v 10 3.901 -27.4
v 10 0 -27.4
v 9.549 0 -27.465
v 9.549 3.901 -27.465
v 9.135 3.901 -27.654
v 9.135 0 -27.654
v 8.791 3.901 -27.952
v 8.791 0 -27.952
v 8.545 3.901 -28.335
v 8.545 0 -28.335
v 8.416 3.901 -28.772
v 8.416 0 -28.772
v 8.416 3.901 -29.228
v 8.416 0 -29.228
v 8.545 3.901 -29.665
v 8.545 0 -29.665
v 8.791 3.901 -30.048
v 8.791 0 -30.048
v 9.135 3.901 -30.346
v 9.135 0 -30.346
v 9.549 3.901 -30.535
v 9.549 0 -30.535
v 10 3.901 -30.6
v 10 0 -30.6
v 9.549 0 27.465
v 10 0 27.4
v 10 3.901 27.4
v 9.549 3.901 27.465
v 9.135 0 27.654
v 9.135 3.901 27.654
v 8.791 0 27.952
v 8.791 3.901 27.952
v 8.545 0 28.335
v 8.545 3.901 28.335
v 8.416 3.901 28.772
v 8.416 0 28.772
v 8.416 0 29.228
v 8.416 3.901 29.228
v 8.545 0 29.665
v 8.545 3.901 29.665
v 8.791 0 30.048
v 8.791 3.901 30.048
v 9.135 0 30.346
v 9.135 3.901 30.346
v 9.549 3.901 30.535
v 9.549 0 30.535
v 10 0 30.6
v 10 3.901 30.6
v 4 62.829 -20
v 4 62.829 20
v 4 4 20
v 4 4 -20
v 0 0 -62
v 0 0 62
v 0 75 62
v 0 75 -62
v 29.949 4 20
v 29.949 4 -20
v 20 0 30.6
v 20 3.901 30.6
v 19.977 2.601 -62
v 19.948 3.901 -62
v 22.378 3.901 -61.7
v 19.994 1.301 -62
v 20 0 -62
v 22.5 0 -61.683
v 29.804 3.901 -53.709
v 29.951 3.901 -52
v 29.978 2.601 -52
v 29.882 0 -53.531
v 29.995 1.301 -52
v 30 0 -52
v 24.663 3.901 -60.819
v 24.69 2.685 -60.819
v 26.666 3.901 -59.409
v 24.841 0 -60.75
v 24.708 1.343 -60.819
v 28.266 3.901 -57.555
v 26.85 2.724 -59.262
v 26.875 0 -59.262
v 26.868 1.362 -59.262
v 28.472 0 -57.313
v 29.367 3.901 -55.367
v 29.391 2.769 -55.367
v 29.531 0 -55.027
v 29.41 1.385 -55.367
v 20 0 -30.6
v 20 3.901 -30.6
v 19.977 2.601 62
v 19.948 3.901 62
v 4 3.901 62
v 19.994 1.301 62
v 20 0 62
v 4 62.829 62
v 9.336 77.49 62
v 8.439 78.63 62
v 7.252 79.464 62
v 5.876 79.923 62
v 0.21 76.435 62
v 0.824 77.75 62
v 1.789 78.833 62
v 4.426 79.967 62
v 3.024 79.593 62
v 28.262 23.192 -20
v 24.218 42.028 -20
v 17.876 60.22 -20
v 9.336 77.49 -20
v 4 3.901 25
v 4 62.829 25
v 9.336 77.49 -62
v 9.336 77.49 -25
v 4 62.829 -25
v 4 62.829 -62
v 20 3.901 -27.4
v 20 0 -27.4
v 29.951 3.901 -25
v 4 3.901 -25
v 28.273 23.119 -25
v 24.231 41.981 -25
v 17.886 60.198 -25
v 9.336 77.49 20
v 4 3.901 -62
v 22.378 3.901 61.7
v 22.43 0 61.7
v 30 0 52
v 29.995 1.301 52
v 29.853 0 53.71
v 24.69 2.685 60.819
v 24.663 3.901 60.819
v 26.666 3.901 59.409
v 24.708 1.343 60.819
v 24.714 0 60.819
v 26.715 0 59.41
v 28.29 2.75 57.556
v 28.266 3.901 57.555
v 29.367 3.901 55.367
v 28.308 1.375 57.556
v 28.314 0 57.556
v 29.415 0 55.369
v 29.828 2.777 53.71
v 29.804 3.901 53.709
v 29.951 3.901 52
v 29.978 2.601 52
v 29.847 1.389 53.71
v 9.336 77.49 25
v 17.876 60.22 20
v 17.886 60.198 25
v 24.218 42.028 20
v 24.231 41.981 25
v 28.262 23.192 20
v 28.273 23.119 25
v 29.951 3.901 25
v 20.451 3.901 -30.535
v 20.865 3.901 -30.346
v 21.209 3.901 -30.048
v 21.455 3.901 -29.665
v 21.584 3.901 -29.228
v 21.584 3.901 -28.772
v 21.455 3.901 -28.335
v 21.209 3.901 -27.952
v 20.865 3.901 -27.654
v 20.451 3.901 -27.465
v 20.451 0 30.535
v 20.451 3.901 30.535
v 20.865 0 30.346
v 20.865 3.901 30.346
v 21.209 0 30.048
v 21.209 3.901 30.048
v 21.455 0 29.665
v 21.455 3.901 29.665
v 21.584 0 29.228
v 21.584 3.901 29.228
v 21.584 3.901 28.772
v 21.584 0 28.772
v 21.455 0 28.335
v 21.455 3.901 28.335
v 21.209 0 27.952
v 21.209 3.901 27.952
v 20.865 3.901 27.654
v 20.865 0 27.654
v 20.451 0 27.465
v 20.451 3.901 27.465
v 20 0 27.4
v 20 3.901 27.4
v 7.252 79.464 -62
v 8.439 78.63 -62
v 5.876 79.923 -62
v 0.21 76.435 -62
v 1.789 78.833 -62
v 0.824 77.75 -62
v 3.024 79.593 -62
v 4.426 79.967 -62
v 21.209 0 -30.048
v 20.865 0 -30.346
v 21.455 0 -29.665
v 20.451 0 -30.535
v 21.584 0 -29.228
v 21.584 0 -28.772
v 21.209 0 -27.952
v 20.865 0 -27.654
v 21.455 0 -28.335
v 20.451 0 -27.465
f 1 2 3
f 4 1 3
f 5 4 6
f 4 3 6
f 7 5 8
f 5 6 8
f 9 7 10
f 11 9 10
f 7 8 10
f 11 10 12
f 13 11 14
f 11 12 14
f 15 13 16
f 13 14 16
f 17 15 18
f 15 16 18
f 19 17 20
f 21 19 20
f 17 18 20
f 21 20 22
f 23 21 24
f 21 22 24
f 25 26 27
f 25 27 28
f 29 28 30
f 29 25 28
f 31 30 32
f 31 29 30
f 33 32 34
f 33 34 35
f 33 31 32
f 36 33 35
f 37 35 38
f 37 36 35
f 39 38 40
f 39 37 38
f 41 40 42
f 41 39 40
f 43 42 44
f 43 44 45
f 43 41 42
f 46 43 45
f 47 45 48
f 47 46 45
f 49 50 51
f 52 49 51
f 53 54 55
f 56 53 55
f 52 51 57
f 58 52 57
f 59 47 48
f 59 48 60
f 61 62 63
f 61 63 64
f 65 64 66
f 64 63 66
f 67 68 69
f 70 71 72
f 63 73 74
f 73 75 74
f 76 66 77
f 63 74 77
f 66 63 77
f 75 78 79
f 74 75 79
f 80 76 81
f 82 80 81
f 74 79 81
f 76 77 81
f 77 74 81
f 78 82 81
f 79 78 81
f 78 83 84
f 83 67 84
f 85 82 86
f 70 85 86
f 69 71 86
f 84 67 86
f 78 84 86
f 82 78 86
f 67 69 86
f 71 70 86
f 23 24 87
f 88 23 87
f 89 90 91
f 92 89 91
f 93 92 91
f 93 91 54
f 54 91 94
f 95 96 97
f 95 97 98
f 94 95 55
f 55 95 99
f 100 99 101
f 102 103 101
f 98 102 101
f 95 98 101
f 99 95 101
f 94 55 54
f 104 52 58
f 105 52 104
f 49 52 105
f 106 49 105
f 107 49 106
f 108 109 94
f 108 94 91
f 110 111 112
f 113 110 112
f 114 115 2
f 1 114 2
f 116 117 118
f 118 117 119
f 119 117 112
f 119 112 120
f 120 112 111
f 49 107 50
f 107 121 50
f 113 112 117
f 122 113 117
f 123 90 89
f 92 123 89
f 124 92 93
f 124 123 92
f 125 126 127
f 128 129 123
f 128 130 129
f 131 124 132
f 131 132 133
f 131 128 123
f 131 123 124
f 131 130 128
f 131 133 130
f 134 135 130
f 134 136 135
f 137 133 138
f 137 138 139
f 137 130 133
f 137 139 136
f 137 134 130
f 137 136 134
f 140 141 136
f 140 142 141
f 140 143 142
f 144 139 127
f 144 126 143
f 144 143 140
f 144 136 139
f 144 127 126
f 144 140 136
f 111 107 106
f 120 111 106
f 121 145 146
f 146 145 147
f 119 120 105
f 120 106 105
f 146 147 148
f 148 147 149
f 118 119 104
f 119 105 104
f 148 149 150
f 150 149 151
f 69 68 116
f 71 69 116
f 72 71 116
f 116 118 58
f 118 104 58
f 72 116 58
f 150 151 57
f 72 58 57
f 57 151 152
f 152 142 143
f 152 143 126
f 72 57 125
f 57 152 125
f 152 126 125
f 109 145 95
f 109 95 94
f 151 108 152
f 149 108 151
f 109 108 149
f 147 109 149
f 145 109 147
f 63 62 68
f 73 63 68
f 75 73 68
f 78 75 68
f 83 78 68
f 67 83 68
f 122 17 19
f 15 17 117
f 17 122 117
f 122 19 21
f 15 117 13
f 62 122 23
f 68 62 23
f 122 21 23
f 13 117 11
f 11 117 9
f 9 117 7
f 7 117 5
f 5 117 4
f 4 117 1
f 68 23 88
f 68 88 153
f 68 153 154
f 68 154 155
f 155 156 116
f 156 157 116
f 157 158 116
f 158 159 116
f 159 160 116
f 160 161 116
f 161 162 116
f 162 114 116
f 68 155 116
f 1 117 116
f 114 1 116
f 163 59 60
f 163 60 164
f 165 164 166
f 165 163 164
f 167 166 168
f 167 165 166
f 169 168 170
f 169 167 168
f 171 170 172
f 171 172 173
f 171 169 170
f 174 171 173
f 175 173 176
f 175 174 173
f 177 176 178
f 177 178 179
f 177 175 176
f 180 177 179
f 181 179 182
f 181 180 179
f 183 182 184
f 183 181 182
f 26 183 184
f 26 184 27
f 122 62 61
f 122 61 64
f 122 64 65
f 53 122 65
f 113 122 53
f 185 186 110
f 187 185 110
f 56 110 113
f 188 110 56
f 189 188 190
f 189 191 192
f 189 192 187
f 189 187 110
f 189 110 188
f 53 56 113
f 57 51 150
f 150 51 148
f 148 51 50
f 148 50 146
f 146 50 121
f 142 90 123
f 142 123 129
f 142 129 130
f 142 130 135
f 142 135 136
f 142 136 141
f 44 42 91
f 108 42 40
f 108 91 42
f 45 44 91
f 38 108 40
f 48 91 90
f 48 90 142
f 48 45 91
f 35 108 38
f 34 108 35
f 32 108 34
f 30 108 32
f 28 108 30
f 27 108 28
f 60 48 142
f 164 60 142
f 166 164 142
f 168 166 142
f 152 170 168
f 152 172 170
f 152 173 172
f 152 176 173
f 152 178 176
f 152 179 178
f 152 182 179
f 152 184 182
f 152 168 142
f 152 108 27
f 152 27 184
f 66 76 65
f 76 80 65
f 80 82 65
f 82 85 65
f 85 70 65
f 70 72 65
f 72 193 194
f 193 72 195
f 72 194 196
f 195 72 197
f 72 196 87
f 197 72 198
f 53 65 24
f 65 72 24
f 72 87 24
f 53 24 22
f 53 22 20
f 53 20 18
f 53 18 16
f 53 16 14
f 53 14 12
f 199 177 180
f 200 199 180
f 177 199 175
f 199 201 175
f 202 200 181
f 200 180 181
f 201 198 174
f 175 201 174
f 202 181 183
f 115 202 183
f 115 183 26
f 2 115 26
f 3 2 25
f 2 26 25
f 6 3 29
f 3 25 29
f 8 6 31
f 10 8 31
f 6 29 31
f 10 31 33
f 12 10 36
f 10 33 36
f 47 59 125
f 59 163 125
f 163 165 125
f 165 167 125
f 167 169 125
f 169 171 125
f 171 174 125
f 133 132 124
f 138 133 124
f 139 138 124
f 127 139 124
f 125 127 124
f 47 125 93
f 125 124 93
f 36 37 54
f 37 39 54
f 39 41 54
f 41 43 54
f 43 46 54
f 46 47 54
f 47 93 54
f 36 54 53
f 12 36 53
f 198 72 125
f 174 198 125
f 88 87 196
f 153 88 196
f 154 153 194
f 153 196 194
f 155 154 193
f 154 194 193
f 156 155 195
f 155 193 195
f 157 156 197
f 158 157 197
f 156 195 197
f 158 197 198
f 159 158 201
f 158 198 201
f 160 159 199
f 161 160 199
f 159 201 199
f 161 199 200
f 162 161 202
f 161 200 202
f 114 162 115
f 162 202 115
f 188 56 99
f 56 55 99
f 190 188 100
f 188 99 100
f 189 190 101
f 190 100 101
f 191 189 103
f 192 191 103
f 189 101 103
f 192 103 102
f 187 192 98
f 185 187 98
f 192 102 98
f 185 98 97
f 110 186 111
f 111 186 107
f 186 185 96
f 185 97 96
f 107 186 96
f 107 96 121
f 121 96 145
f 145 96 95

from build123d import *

# Parameters (mm, degrees)
SALIENTE_EXTRUIR1_DEPTH = 62
CORTAR_EXTRUIR1_DEPTH   = 20
CORTAR_EXTRUIR2_START   = 25
CORTAR_EXTRUIR2_DEPTH   = 124
CORTAR_EXTRUIR3_DEPTH   = 3.901378
REDONDEO1_R             = 10


with BuildPart() as part:
    # Croquis1 → Saliente-Extruir1 (new body, symmetric)
    with BuildSketch(Plane.XY):
        with BuildLine():
            Line((0, 0), (0, 75))
            ThreePointArc((0, 75), (3.711686747, 79.831174698), (9.336099585, 77.489626556))
            ThreePointArc((9.336099585, 77.489626556), (24.745312475, 40.098749993), (30, 0))
            Line((30, 0), (0, 0))
        make_face()
    extrude(amount=SALIENTE_EXTRUIR1_DEPTH, both=True)

    # Croquis3 → Cortar-Extruir1 (cut, symmetric)
    with BuildSketch(Plane.XY):
        Polygon((9.336099585, 77.489626556), (4, 62.828813438), (4, 4), (29.948585885, 4), (32.228439928, 77.489626556), align=None)
    extrude(amount=CORTAR_EXTRUIR1_DEPTH, both=True, mode=Mode.SUBTRACT)

    # Croquis4 → Cortar-Extruir2 (cut)
    with BuildSketch(Plane.XY.offset(CORTAR_EXTRUIR2_START)):
        Polygon((9.336099585, 77.489626556), (4, 62.828813438), (4, 3.901378225), (34.928853612, 3.901378225), (21.567933324, 77.489626556), align=None)
    cortar_extruir2 = extrude(amount=CORTAR_EXTRUIR2_DEPTH, mode=Mode.SUBTRACT)

    # Simetría1: Cortar-Extruir2 across plane
    add(cortar_extruir2.mirror(Plane.XY), mode=Mode.SUBTRACT)

    # Croquis5 → Cortar-Extruir3 (cut)
    with BuildSketch(Plane.XZ):
        with BuildLine():
            Line((10, 30.6), (20, 30.6))
            ThreePointArc((20, 30.6), (21.6, 29), (20, 27.4))
            Line((20, 27.4), (10, 27.4))
            ThreePointArc((10, 27.4), (8.4, 29), (10, 30.6))
        make_face()
        with BuildLine():
            Line((10, -30.6), (20, -30.6))
            ThreePointArc((20, -30.6), (21.6, -29), (20, -27.4))
            Line((20, -27.4), (10, -27.4))
            ThreePointArc((10, -27.4), (8.4, -29), (10, -30.6))
        make_face()
    extrude(amount=-CORTAR_EXTRUIR3_DEPTH, mode=Mode.SUBTRACT)

    # Redondeo1
    redondeo1_edges = [part.edges().sort_by_distance(p)[0] for p in [
        (29.987772095, 1.950842396, -62),
        (29.987772095, 1.950842396, 62),
    ]]
    fillet(redondeo1_edges, radius=REDONDEO1_R)


solid = part.part
